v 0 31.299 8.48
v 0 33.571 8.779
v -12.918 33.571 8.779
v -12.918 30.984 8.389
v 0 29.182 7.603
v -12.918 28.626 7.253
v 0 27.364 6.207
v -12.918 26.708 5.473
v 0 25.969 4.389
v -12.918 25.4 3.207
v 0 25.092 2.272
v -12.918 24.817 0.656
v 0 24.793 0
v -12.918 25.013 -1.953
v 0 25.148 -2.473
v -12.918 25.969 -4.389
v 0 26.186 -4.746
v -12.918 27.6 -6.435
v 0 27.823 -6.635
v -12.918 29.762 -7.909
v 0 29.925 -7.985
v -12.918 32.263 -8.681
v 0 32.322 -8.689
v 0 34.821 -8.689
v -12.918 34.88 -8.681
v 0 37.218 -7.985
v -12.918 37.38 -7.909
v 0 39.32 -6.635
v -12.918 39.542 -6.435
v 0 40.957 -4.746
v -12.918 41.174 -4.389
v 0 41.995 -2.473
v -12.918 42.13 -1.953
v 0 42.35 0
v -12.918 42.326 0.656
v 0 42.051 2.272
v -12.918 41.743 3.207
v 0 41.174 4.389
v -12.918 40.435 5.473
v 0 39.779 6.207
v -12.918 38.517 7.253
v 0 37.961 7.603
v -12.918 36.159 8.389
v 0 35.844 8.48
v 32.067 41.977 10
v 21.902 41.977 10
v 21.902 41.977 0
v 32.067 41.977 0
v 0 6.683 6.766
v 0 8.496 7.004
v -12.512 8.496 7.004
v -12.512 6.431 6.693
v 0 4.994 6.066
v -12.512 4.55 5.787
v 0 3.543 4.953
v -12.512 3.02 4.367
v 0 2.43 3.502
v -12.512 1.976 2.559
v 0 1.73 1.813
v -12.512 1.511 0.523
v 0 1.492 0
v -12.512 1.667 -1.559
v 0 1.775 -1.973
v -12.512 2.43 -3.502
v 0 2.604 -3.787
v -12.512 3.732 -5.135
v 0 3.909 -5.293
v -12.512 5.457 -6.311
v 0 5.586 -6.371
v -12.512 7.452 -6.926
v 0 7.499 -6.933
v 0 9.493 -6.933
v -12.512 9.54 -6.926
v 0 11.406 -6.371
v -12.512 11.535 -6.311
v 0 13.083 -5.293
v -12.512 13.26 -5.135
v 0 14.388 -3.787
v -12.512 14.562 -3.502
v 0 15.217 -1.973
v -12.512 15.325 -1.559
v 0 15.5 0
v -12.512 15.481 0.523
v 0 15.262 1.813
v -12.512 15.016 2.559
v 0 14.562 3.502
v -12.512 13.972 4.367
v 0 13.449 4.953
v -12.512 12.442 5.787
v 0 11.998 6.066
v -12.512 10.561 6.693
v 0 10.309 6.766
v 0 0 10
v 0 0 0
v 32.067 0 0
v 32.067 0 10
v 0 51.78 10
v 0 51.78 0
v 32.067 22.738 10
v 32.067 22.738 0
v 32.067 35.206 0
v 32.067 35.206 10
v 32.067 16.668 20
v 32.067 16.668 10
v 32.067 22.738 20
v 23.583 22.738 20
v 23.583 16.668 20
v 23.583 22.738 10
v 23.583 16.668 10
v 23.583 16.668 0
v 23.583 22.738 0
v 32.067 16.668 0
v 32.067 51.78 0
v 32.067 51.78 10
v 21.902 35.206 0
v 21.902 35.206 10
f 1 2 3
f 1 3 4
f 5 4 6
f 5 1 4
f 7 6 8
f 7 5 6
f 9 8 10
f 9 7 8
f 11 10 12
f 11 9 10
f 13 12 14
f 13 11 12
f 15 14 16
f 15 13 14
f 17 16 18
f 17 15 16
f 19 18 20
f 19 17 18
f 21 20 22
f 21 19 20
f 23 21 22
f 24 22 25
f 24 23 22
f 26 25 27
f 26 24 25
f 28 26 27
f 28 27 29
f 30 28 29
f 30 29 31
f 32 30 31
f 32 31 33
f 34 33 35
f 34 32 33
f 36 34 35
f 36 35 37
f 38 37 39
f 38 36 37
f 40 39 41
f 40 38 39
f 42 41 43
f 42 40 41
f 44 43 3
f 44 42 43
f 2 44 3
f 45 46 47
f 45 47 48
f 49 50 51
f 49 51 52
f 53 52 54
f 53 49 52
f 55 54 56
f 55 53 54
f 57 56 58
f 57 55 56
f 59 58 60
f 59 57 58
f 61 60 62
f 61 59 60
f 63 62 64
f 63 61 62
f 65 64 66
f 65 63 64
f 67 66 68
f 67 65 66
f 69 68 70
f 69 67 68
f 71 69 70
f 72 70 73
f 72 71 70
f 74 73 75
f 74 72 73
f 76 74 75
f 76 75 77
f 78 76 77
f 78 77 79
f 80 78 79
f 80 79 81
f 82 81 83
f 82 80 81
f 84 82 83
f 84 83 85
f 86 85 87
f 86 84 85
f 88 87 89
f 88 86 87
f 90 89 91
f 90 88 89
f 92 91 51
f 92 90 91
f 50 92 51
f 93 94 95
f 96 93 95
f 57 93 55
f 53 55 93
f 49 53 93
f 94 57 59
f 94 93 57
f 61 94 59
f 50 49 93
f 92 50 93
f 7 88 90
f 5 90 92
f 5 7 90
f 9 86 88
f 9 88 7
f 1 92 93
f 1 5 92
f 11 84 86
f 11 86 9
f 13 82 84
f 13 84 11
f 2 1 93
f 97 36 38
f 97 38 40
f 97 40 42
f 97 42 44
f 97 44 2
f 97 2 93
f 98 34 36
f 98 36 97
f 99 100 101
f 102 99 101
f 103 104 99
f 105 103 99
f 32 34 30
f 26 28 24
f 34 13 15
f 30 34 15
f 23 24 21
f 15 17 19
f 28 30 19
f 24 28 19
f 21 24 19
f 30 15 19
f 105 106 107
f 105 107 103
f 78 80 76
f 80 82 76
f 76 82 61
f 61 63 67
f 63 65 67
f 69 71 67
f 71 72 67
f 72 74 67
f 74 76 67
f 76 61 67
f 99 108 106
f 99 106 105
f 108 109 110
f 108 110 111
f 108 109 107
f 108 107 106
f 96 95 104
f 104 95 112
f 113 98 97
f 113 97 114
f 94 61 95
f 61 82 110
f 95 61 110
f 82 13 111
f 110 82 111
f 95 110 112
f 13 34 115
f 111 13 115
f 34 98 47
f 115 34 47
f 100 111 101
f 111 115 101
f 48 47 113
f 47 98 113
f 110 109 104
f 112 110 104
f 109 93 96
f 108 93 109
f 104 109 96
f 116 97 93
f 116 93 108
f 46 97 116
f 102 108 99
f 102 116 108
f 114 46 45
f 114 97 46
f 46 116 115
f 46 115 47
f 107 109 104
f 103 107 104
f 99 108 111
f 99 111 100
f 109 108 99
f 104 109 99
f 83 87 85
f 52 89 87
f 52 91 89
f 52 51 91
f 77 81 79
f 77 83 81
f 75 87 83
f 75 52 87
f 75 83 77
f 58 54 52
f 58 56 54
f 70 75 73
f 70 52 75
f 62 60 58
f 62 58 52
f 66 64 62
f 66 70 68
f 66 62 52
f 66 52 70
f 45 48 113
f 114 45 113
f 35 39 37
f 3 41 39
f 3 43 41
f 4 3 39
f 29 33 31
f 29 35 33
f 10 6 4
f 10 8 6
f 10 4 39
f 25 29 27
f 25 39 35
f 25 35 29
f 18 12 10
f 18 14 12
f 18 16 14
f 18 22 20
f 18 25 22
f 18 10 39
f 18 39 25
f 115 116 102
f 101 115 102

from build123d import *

# Parameters (mm, degrees)
SKETCH_2_W          = 32.066867352
SKETCH_2_H          = 51.780105479
EXTRUDE_1_DEPTH     = 10
SKETCH_3_W          = 12.917655966
SKETCH_3_H          = 8.778717504
SKETCH_4_W          = 12.512273986
SKETCH_4_H          = 7.004295881
SKETCH_5_W          = 8.483669896
SKETCH_5_H          = 6.070389764
SKETCH_5_W_2        = 10.164700908
SKETCH_5_H_2        = 6.770819351
CUT_EXTRUDE_1_DEPTH = 10
SKETCH_5_3_W        = 8.483669896
SKETCH_5_3_H        = 6.070389764
EXTRUDE_2_DEPTH     = 10


with BuildPart() as part:
    # 草图2 → 凸台-拉伸1 (new body)
    with BuildSketch(Plane.XY):
        with Locations((16.033433676, 25.89005274)):
            Rectangle(SKETCH_2_W, SKETCH_2_H)
    extrude(amount=EXTRUDE_1_DEPTH)

    # 草图3 → 旋转1 (revolve)
    with BuildSketch(Plane.XY):
        with Locations((-6.458827983, 37.960789308)):
            Rectangle(SKETCH_3_W, SKETCH_3_H)
    revolve(axis=Axis((-12.917655966, 33.571430556, 0), (1, 0, 0)))

    # 草图4 → 旋转2 (revolve)
    with BuildSketch(Plane.XY):
        with Locations((-6.256136993, 11.998199242)):
            Rectangle(SKETCH_4_W, SKETCH_4_H)
    revolve(axis=Axis((-12.512273986, 8.496051301, 0), (1, 0, 0)))

    # 草图5 → 切除-拉伸1 (cut)
    with BuildSketch(Plane.XY.offset(10)):
        with Locations((27.825032404, 19.702924711)):
            Rectangle(SKETCH_5_W, SKETCH_5_H)
        with Locations((26.984516898, 38.591175938)):
            Rectangle(SKETCH_5_W_2, SKETCH_5_H_2)
    extrude(amount=-CUT_EXTRUDE_1_DEPTH, mode=Mode.SUBTRACT)


with BuildPart() as body_2:
    # 草图5<3> → 凸台-拉伸2 (new body)
    with BuildSketch(Plane.XY.offset(10)):
        with Locations((27.825032404, 19.702924711)):
            Rectangle(SKETCH_5_3_W, SKETCH_5_3_H)
    extrude(amount=EXTRUDE_2_DEPTH)


solid = Compound([part.part, body_2.part])
